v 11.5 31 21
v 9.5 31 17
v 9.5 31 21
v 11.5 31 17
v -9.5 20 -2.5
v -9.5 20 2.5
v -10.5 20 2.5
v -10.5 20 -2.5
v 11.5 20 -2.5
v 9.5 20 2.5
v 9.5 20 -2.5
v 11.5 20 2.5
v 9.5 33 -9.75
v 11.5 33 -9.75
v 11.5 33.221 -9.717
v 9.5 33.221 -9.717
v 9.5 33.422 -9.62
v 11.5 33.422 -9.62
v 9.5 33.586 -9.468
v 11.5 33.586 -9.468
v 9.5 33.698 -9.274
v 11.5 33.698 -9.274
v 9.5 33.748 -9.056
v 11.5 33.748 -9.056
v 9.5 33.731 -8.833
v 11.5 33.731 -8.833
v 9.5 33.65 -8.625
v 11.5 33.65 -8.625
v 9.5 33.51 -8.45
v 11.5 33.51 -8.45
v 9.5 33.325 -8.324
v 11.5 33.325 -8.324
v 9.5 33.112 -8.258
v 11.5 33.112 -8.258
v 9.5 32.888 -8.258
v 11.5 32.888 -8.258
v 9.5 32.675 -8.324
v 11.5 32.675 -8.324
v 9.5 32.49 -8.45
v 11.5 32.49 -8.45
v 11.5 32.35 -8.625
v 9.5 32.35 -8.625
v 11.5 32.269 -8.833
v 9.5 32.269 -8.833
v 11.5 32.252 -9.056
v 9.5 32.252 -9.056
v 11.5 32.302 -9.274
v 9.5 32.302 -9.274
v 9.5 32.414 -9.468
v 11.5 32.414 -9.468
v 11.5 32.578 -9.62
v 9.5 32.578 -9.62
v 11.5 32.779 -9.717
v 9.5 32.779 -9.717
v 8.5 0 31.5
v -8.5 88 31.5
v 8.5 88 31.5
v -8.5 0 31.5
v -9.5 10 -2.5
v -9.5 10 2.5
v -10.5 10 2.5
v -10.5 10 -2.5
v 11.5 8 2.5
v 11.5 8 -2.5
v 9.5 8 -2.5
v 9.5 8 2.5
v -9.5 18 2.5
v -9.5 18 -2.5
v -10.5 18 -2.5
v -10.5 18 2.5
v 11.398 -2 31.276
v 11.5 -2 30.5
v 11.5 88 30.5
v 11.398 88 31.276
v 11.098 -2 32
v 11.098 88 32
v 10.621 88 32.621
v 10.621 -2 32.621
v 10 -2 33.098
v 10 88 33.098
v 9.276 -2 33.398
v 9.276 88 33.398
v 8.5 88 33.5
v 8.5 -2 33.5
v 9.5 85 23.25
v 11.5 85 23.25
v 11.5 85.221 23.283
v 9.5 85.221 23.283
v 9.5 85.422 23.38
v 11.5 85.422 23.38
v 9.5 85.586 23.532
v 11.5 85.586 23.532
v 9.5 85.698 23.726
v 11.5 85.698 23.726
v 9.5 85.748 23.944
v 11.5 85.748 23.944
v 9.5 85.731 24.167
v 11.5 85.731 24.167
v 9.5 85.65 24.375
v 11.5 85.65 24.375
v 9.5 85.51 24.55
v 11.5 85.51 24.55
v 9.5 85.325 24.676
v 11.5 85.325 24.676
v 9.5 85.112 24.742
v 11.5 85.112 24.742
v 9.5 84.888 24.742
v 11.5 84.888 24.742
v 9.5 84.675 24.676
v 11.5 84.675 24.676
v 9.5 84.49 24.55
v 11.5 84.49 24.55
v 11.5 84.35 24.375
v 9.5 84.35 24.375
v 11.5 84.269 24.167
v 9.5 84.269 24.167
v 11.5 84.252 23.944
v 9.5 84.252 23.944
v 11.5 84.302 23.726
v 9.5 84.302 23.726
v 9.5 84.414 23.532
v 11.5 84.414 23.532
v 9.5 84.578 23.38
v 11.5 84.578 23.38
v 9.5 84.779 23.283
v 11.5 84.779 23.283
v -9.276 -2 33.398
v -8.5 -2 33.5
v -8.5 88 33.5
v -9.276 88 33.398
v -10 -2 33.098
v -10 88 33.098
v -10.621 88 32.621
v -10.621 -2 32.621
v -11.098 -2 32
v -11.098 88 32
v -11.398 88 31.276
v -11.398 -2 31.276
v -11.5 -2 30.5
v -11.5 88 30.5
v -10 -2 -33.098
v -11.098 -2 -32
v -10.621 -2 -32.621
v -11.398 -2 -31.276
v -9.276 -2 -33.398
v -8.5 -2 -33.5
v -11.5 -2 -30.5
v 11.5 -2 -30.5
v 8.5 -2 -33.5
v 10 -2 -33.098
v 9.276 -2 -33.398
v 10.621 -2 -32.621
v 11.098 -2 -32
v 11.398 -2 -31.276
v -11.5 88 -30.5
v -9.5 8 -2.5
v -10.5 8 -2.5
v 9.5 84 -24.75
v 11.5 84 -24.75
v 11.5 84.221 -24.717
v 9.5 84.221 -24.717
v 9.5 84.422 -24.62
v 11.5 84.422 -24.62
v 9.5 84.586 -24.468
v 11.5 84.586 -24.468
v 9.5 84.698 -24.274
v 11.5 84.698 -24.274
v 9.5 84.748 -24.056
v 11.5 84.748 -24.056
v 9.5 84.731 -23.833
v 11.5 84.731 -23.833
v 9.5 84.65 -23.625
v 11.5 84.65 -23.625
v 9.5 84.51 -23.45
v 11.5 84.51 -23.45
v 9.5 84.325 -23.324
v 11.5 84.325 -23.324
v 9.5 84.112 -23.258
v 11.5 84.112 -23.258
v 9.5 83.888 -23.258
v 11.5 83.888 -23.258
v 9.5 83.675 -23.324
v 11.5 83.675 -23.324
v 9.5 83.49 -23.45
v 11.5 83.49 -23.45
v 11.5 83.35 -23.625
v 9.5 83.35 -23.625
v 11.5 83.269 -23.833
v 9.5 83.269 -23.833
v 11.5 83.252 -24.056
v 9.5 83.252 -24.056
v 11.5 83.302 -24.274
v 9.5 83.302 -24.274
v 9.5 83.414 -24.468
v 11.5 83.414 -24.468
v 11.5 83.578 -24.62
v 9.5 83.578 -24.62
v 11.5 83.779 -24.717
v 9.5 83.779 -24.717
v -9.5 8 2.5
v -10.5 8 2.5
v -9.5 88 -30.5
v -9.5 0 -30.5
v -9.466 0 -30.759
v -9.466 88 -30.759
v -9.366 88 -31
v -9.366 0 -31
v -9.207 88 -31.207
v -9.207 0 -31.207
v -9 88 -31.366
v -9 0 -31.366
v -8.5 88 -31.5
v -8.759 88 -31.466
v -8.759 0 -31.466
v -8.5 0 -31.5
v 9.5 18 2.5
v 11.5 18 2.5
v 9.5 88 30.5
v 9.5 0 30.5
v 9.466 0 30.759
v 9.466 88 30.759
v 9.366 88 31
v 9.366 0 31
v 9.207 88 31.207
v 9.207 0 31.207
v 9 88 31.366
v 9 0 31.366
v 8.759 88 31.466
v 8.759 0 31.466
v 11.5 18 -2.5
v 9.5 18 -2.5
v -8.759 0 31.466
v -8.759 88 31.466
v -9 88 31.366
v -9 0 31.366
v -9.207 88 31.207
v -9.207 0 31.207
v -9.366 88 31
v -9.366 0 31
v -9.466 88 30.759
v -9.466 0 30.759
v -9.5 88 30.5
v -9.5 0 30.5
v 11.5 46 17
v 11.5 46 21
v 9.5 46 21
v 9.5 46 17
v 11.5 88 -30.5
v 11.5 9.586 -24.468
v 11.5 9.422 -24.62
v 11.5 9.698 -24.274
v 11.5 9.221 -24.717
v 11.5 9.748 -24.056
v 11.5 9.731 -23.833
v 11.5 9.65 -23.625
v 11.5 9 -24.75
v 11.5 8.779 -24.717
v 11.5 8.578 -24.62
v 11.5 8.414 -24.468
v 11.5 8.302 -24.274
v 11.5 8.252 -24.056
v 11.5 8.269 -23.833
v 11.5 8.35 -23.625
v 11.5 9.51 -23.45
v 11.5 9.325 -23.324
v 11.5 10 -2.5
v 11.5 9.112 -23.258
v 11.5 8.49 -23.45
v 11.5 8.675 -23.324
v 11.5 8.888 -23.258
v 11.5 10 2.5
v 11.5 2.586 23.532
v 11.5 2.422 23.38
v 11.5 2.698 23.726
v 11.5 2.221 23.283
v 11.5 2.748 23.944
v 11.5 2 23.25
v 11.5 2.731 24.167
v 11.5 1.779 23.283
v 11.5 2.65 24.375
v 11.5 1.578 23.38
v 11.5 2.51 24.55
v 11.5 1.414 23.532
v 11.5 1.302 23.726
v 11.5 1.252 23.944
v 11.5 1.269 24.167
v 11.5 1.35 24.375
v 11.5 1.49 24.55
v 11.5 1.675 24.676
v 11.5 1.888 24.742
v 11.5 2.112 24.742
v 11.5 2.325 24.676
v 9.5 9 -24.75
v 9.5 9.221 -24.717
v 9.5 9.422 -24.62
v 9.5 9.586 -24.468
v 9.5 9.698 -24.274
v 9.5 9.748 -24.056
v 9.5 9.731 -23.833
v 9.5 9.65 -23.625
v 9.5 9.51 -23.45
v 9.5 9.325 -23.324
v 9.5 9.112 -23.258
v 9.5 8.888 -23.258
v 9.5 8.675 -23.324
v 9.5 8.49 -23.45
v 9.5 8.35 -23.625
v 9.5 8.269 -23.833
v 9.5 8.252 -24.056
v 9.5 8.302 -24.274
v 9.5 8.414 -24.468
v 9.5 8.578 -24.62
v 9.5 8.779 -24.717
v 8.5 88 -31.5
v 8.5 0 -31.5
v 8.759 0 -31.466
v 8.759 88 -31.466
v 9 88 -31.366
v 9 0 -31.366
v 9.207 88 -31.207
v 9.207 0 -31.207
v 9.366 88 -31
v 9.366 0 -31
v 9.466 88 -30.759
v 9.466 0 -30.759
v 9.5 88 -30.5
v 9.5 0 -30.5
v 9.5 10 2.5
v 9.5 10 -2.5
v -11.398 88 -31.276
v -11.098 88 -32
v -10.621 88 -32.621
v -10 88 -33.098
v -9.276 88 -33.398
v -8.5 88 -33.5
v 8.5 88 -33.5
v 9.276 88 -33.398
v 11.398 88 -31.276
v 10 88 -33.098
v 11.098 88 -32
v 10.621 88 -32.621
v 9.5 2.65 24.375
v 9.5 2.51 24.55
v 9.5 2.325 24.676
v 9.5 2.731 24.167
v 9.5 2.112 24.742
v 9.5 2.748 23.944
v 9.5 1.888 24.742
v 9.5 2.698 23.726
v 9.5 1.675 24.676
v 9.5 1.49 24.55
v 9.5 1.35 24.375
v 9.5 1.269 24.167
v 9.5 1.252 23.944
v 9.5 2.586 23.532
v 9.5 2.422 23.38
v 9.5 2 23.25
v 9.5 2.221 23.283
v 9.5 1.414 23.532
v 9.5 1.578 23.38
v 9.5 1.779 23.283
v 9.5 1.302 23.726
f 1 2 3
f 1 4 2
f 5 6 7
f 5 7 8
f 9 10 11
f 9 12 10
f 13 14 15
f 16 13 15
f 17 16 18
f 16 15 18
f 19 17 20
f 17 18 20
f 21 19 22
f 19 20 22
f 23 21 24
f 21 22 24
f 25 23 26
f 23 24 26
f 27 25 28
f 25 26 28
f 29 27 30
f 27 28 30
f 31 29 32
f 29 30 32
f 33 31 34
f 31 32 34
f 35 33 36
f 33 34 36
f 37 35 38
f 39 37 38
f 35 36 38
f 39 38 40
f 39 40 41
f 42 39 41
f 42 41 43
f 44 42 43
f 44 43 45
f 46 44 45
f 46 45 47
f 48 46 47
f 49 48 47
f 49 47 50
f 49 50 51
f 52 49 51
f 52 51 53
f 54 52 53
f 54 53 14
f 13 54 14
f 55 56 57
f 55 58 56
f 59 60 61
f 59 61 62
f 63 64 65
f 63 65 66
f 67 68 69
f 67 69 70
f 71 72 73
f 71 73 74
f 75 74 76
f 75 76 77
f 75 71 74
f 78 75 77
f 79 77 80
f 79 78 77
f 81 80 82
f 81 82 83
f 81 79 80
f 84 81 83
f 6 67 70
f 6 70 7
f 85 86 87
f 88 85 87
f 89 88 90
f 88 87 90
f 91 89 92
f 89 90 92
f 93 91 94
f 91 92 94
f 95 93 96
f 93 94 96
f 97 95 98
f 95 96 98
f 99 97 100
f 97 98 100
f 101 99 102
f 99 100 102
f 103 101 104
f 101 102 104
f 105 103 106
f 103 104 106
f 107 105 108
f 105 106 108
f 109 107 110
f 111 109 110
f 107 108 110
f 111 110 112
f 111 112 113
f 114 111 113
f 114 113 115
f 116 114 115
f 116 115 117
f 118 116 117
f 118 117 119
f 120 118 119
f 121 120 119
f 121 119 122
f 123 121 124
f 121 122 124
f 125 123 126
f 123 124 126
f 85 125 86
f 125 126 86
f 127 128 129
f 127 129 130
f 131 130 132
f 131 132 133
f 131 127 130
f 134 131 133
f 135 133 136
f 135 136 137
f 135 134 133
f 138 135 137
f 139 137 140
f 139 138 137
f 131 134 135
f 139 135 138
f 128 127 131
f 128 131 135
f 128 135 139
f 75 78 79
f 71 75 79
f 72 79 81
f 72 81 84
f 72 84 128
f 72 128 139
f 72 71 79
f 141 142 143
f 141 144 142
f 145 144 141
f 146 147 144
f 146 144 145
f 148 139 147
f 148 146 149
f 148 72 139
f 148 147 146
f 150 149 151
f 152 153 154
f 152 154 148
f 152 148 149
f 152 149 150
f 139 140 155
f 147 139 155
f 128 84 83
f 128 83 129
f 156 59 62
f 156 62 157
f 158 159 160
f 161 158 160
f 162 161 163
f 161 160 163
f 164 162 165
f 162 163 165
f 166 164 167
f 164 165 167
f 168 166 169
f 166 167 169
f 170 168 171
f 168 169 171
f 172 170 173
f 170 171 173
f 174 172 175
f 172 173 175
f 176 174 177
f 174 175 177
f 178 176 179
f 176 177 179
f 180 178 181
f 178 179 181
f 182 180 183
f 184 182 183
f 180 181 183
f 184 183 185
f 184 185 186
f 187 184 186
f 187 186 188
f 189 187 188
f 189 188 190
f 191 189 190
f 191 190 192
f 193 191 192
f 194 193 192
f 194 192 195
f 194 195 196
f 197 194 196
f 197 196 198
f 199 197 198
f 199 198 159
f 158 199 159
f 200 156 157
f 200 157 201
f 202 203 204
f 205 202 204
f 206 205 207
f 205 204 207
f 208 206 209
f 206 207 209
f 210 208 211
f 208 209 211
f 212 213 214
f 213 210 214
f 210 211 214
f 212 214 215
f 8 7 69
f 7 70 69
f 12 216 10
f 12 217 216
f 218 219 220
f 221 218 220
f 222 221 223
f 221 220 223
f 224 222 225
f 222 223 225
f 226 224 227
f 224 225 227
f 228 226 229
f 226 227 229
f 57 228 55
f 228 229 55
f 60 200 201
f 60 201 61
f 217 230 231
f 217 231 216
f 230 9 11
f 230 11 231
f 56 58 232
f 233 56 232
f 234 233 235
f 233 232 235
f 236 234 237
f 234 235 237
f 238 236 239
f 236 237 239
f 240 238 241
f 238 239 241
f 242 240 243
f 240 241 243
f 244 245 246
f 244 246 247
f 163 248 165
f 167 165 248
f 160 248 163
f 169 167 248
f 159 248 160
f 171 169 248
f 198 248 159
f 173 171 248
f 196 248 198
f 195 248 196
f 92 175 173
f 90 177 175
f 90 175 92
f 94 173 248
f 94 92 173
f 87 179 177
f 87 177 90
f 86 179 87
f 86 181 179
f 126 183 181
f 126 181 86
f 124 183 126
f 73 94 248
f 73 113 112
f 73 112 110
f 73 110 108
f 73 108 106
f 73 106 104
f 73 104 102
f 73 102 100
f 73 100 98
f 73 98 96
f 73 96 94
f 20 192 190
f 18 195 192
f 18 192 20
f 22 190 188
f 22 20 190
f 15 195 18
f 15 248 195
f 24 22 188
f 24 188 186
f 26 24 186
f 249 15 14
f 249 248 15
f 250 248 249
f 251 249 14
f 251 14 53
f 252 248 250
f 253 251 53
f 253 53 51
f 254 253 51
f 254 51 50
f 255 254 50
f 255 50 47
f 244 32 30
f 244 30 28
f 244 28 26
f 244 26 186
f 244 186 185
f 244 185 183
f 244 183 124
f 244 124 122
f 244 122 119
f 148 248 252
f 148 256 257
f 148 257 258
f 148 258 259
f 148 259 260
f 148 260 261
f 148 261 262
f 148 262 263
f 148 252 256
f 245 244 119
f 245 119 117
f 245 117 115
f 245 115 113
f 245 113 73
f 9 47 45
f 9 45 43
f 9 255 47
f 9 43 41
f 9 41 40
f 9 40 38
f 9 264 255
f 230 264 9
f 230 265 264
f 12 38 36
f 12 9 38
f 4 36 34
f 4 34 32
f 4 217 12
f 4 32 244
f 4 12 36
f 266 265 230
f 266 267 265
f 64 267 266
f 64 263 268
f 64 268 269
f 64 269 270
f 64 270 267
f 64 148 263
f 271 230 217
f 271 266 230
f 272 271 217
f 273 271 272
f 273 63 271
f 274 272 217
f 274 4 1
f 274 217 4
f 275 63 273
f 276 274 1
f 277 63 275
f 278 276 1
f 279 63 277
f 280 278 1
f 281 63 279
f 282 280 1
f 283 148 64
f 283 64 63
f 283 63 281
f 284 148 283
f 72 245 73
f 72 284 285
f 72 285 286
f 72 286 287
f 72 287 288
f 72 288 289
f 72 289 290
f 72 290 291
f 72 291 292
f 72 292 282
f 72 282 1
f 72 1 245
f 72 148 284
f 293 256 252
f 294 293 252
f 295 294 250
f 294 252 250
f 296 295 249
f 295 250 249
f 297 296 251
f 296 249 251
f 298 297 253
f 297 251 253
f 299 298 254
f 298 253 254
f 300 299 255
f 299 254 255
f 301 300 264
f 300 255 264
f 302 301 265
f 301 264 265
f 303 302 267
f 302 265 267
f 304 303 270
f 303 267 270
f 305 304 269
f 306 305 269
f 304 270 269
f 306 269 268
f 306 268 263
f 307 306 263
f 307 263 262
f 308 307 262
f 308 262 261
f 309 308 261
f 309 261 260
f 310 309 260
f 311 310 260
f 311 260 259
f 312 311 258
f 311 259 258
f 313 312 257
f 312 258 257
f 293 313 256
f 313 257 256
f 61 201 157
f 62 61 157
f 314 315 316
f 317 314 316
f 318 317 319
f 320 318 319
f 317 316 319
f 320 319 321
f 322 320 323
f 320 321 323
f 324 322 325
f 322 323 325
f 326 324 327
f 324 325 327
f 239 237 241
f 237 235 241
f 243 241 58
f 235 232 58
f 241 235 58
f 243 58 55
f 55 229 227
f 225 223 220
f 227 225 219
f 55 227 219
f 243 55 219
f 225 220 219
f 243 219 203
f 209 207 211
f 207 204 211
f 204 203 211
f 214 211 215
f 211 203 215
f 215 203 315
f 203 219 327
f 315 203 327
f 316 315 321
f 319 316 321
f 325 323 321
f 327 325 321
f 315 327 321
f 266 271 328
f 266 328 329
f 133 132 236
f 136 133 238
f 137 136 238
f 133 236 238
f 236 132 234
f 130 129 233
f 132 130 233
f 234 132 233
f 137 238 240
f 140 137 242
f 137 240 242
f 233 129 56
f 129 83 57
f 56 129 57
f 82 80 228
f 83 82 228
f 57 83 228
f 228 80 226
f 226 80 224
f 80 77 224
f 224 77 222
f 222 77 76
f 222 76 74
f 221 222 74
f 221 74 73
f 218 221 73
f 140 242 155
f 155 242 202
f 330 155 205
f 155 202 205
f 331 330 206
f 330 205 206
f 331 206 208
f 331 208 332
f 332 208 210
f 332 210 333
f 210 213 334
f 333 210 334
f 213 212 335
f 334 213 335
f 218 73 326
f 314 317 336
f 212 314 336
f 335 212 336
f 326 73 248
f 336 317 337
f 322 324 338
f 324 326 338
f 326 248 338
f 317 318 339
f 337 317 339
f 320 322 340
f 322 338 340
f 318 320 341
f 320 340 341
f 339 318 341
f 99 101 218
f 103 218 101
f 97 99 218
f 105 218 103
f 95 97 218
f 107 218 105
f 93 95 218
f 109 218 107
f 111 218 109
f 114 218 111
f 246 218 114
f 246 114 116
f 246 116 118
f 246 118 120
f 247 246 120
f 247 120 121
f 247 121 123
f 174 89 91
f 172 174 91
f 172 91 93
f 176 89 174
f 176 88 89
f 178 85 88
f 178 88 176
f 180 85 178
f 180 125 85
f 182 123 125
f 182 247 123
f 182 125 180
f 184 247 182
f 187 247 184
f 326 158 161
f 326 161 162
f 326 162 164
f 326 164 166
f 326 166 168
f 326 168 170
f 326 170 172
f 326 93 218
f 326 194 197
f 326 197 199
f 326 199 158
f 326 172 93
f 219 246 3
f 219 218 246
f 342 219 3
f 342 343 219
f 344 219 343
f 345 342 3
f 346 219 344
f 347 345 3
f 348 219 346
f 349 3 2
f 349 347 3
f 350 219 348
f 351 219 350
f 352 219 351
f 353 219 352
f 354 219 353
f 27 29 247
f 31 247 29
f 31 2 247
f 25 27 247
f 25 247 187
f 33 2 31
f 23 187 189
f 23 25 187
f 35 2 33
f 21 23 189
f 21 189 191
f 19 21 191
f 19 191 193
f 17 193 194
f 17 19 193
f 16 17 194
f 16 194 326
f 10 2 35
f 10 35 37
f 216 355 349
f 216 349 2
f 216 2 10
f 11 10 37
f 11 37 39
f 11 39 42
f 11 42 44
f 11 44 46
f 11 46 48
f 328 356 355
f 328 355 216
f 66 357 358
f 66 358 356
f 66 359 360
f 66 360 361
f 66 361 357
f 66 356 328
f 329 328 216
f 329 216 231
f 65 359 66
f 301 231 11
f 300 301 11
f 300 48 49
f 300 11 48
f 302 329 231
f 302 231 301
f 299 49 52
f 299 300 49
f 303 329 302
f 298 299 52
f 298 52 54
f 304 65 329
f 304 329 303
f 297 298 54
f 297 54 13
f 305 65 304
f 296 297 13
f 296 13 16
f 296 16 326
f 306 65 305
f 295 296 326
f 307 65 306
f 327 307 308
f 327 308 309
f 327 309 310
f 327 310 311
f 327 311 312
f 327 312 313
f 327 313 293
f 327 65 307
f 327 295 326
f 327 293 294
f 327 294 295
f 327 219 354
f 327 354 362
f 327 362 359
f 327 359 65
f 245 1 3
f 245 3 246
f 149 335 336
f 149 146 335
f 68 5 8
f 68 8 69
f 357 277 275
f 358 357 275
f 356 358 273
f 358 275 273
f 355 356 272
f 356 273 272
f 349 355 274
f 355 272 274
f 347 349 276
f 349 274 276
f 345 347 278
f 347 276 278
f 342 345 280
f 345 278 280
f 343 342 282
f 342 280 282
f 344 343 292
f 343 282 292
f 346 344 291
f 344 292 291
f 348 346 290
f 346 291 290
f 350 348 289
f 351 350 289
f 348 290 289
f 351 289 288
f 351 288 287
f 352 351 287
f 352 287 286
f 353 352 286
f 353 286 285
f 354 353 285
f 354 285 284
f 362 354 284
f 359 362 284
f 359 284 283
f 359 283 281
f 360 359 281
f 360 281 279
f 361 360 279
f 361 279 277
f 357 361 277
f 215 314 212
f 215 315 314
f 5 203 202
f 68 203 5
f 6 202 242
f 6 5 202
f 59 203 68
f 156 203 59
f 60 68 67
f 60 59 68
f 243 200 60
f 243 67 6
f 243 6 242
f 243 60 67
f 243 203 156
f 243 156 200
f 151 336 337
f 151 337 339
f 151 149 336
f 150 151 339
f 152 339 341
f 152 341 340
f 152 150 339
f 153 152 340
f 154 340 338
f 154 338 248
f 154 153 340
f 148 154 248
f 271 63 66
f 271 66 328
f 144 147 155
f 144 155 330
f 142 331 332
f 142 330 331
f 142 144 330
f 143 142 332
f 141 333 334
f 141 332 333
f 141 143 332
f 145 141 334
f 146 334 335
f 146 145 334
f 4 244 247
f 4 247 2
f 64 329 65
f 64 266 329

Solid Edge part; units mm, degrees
sketch "Sketch1" plane through (0, 0, 0) normal (0, -1, 0) x (1, 0, 0)
  arc A0 (11.5, 30.5) -> (8.5, 33.5) centre (8.5, 30.5) ccw
  line L0 (8.5, 33.5) -> (-8.5, 33.5)
  arc A1 (-8.5, 33.5) -> (-11.5, 30.5) centre (-8.5, 30.5) ccw
  line L1 (-11.5, 30.5) -> (-11.5, -30.5)
  arc A2 (-8.5, -33.5) -> (-11.5, -30.5) centre (-8.5, -30.5) cw
  line L2 (-8.5, -33.5) -> (8.5, -33.5)
  arc A3 (8.5, -33.5) -> (11.5, -30.5) centre (8.5, -30.5) ccw
  line L3 (11.5, -30.5) -> (11.5, 30.5)
  line L4 (-9.5, -30.5) -> (-9.5, 30.5)
  arc A4 (-9.5, 30.5) -> (-8.5, 31.5) centre (-8.5, 30.5) cw
  line L5 (-8.5, 31.5) -> (8.5, 31.5)
  arc A5 (9.5, 30.5) -> (8.5, 31.5) centre (8.5, 30.5) ccw
  line L6 (9.5, 30.5) -> (9.5, -30.5)
  arc A6 (8.5, -31.5) -> (9.5, -30.5) centre (8.5, -30.5) ccw
  line L7 (8.5, -31.5) -> (-8.5, -31.5)
  arc A7 (-8.5, -31.5) -> (-9.5, -30.5) centre (-8.5, -30.5) cw
  dimension "D1" = 63
  dimension "D2" = 1
  dimension "D3" = 1
  dimension "D4" = 1
  dimension "D5" = 1
  dimension "D6" = 2
  dimension "D7" = 2
  dimension "D8" = 9.5
  dimension "D9" = 31.5
  dimension "D10" = 19
  dimension "D11" = 23
  dimension "D12" = 17
  dimension "D13" = 67
extrude "Protrusion1" add sketch "Sketch1" against normal blind 88
sketch "Sketch2" plane through (0, 0, 0) normal (0, -1, 0) x (1, 0, 0)
  line L0 (11.5, -30.5) -> (11.5, 30.5)
  arc A0 (11.5, 30.5) -> (8.5, 33.5) centre (8.5, 30.5) ccw
  line L1 (8.5, 33.5) -> (-8.5, 33.5)
  arc A1 (-8.5, 33.5) -> (-11.5, 30.5) centre (-8.5, 30.5) ccw
  line L2 (-11.5, 30.5) -> (-11.5, -30.5)
  arc A2 (-8.5, -33.5) -> (-11.5, -30.5) centre (-8.5, -30.5) cw
  line L3 (-8.5, -33.5) -> (8.5, -33.5)
  arc A3 (8.5, -33.5) -> (11.5, -30.5) centre (8.5, -30.5) ccw
extrude "Boden" add sketch "Sketch2" along normal blind 2
hole "Hole1" at (11.5, 9, -24) direction (-1, 0, 0) diameter 1.5 end up to next
hole "Hole2" at (11.5, 2, 24) direction (-1, 0, 0) diameter 1.5 end up to next
sketch "Sketch3" plane through (11.5, 57, 0) normal (1, 0, 0) x (0, 0, -1)
  line L0 (-2.5, -37) -> (2.5, -37)
  line L1 (2.5, -37) -> (2.5, -39)
  line L2 (2.5, -39) -> (-2.5, -39)
  line L3 (-2.5, -39) -> (-2.5, -37)
  line L4 (-2.5, -47) -> (2.5, -47)
  line L5 (2.5, -47) -> (2.5, -49)
  line L6 (2.5, -49) -> (-2.5, -49)
  line L7 (-2.5, -49) -> (-2.5, -47)
  dimension "D1" = 2
  dimension "D2" = 5
  dimension "D3" = 2
  dimension "D4" = 5
  dimension "D5" = 8
  dimension "D6" = 8
extrude "Höhenauschnitt" cut sketch "Sketch3" against normal blind 22
hole "Hole3" at (11.5, 33, -9) direction (-1, 0, 0) diameter 1.5 end up to next
hole "Hole4" at (11.5, 84, -24) direction (-1, 0, 0) diameter 1.5 end up to next
hole "Hole5" at (11.5, 85, 24) direction (-1, 0, 0) diameter 1.5 end up to next
sketch "Sketch4" plane through (11.5, 42.5, 0) normal (1, 0, 0) x (0, 0, -1)
  line L0 (-21, 3.5) -> (-17, 3.5)
  line L1 (-17, 3.5) -> (-17, -11.5)
  line L2 (-17, -11.5) -> (-21, -11.5)
  line L3 (-21, -11.5) -> (-21, 3.5)
  dimension "D1" = 4
  dimension "D2" = 15
  dimension "D3" = 41
  dimension "D4" = 22
extrude "Stromkabelloch" cut sketch "Sketch4" against normal blind 3
